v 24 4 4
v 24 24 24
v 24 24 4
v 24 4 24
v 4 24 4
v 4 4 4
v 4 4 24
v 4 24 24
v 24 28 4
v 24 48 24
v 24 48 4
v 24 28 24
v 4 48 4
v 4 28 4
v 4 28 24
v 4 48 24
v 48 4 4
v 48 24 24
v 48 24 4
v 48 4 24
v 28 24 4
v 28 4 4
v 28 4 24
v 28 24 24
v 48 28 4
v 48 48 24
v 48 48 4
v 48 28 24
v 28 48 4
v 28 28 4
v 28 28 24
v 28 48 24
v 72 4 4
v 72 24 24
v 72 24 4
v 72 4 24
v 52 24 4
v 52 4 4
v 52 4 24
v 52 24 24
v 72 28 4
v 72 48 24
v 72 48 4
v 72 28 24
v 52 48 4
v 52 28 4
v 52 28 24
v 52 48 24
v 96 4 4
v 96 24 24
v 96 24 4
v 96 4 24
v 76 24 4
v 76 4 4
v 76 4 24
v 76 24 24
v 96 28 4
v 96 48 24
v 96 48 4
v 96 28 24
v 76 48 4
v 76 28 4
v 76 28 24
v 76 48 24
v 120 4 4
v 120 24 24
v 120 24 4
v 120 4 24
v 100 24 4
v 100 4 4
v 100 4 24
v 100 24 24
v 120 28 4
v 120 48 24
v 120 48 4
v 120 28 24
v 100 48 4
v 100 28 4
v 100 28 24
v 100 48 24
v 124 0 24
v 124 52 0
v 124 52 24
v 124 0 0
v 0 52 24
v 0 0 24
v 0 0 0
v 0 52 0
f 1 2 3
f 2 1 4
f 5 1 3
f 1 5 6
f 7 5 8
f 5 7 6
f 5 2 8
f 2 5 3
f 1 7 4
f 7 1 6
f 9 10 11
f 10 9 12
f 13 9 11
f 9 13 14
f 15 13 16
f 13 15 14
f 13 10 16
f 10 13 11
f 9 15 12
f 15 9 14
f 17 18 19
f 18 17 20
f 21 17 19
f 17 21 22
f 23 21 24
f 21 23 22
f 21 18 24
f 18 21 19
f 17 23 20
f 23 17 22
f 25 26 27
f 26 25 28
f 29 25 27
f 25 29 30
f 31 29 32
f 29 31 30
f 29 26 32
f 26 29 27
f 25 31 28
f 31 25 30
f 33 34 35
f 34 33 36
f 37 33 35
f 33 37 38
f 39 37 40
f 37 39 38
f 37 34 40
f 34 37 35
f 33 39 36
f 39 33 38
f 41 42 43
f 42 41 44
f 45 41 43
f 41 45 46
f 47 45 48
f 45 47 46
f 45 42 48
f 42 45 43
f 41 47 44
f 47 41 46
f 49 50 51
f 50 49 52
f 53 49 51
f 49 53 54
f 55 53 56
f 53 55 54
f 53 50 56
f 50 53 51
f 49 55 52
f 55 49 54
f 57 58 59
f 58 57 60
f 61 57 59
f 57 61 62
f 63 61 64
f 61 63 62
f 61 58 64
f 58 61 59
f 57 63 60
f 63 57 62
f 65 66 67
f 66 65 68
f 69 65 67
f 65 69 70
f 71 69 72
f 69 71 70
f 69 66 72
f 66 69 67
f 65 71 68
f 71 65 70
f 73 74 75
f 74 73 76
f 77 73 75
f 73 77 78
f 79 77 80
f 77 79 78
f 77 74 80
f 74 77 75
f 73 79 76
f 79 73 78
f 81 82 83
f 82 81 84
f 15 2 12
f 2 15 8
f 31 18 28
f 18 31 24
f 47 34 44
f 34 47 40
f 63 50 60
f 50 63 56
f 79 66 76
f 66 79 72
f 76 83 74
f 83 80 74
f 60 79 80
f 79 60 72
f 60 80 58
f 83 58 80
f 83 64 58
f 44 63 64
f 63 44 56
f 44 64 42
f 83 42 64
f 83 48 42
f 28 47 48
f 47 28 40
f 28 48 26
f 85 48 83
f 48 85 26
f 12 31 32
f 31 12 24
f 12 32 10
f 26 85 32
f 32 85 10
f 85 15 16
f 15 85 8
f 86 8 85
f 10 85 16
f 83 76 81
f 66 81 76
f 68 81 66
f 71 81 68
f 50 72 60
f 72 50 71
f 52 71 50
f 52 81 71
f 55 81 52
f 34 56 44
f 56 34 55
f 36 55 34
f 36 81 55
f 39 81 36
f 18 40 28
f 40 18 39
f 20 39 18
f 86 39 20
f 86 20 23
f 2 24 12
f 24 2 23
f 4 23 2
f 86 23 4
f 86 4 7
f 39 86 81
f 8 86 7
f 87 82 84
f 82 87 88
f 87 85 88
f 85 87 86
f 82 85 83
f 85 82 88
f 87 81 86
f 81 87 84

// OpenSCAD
// [FL_INDEX: keywords="openscad, 3d_parametric, Ten_Frame_Math_Manipulative, csg_solid" | COT="Parametric OpenSCAD design from 3DCodeverse"]
// Title: Ten Frame Math Manipulative

// Ten frame generation script
//
// enter size of each cube/space as cubesize
// enter number of cubes/spaces across in framecount
// enter how many rows of the frame as rowcount
//
// Designed by: John Yang
// Thingiverse user: ljyang
// released CC-BY-SA

//	Size of hole
cube_size=20; // [1:30]
// Number of holes in frame
frame_size=5; // [1:20]
// Number of rows in frame
row_count=2; // [1:20]

hidden_wallsize=cube_size*0.2;
hidden_cubeandwall=cube_size + hidden_wallsize;
hidden_totalwidth=row_count*hidden_cubeandwall + hidden_wallsize;
hidden_totallength=frame_size*hidden_cubeandwall + hidden_wallsize;

difference(){
	cube([hidden_totallength,hidden_totalwidth,hidden_cubeandwall]);
	for (i = [0:frame_size-1]){
		for (j = [0:row_count-1]){
			translate([(i*hidden_cubeandwall + hidden_wallsize),(j*hidden_cubeandwall + hidden_wallsize),hidden_wallsize]) cube([cube_size,cube_size,hidden_cubeandwall]);
		}
	}
}
